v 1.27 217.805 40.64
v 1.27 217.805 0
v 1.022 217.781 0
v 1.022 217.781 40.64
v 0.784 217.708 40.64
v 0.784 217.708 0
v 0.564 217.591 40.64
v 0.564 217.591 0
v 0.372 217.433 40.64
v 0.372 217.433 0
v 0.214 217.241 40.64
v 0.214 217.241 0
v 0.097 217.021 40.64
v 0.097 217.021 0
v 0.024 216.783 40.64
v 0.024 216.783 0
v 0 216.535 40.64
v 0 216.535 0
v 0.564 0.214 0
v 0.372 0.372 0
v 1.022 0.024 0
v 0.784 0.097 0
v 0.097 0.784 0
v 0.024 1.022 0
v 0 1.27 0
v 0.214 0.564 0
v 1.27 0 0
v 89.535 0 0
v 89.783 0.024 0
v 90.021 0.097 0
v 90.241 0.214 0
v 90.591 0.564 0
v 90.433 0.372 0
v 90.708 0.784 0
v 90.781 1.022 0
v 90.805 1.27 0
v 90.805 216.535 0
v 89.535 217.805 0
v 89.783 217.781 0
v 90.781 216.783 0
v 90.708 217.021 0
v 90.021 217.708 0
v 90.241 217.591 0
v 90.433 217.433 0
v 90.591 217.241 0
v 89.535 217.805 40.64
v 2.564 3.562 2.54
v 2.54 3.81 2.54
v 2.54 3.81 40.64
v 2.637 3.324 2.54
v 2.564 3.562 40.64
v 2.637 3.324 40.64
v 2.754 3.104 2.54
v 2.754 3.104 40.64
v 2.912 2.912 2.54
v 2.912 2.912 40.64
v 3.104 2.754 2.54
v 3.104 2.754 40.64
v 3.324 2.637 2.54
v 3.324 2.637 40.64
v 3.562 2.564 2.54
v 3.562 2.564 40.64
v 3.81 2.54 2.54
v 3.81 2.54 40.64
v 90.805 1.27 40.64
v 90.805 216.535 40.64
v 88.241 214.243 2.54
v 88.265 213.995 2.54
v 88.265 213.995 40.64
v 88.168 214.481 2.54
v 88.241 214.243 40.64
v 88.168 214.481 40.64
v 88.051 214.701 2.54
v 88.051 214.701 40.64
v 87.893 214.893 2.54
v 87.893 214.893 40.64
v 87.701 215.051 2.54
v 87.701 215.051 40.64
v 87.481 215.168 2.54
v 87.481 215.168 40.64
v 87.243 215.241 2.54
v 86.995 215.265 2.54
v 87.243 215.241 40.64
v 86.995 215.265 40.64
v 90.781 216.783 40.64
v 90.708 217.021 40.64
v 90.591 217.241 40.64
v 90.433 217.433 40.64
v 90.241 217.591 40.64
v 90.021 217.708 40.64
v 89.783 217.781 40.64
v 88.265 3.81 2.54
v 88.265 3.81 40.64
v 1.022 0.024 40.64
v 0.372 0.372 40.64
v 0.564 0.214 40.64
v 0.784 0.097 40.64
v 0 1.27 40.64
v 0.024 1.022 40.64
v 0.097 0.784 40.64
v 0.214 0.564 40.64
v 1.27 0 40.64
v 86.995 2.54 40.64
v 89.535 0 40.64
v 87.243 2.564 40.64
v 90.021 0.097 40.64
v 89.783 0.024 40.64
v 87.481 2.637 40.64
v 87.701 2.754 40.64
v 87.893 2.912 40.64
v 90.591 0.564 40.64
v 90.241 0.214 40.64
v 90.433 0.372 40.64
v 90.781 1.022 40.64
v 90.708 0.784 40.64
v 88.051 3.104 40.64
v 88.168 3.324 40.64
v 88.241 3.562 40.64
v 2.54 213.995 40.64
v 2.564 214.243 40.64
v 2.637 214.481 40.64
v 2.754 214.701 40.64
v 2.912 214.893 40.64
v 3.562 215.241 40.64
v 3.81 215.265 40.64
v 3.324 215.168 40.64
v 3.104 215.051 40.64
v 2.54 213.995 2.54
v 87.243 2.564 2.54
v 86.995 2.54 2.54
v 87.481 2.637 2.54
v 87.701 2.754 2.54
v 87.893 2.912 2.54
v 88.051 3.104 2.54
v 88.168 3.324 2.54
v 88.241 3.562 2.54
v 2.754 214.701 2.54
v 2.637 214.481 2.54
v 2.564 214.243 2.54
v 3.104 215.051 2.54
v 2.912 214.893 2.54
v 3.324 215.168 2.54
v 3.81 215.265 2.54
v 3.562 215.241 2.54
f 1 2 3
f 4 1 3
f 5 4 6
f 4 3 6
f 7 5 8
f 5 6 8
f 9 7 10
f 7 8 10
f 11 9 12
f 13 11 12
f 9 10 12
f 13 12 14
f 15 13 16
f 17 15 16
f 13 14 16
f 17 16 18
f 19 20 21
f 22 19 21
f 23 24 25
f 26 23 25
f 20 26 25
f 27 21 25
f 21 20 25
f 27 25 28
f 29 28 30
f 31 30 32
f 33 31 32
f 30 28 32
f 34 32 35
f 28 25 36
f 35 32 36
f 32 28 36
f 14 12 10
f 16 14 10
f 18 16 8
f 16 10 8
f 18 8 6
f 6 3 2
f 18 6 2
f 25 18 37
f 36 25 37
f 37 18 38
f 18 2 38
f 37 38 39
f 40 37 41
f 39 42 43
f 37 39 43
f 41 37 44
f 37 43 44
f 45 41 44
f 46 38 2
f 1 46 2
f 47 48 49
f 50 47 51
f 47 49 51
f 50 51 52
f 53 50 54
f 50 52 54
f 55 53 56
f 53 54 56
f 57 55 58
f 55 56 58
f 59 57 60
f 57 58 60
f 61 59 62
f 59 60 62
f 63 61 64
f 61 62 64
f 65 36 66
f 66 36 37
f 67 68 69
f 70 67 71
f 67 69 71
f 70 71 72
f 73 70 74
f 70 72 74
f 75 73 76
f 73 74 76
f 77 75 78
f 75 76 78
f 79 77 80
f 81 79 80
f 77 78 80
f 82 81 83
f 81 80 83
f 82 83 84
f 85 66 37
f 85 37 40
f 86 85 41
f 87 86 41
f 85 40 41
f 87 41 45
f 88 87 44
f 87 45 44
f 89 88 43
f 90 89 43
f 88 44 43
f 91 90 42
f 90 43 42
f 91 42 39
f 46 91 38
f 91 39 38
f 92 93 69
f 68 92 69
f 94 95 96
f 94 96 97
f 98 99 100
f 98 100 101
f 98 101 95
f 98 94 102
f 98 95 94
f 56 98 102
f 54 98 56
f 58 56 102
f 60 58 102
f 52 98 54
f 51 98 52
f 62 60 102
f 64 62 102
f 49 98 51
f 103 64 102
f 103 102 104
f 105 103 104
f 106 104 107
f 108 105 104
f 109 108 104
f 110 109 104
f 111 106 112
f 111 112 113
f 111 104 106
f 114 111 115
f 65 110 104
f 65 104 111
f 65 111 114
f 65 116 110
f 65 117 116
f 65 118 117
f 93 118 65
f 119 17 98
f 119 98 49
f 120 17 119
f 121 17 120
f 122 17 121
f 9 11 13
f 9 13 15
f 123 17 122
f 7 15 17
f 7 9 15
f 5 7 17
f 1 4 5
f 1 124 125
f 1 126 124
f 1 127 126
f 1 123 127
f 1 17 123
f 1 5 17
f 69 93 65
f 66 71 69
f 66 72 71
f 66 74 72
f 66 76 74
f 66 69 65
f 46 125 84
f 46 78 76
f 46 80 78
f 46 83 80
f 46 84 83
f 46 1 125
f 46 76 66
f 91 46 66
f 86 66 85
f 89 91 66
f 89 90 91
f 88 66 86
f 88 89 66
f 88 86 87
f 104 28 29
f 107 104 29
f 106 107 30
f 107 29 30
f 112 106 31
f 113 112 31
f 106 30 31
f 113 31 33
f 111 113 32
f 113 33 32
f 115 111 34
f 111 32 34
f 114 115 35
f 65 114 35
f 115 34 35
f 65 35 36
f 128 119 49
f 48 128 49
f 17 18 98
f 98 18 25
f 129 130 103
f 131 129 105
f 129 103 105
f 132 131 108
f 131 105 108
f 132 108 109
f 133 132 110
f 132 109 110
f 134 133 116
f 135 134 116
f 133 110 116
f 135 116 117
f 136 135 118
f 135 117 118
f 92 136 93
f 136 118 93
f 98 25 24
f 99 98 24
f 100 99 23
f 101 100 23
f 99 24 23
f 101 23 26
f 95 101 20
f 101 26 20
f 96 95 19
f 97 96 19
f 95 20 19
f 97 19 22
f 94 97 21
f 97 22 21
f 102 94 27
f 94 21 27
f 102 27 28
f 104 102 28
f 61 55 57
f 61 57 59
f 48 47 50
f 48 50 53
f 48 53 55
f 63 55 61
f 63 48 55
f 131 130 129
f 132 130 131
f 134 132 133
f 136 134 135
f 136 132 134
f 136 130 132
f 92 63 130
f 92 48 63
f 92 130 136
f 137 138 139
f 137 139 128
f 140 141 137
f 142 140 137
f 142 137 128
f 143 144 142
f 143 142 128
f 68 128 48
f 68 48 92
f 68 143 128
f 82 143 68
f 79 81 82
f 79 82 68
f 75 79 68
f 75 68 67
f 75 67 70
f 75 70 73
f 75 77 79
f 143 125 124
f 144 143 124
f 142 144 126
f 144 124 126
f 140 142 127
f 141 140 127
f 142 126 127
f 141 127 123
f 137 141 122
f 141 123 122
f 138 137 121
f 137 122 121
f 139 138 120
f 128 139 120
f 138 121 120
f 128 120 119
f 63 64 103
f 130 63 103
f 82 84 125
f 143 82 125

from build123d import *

# Parameters (mm, degrees)
F2_DEPTH = 40.64
F4_DEPTH = 38.1


# Not quite as in the source:
# - a variable given as a bare number and used for a length is read in inches; the dataset says mm whatever the document's units were


with BuildPart() as f2:
    # F1 (on Top) → F2 (new body)
    with BuildSketch(Plane.XY):
        with BuildLine():
            ThreePointArc((0, 1.27), (0.3719743879, 0.3719743879), (1.27, 0))
            Line((1.27, 0), (89.535, 0))
            ThreePointArc((89.535, 0), (90.4330256121, 0.3719743879), (90.805, 1.27))
            Line((90.805, 1.27), (90.805, 216.535))
            ThreePointArc((90.805, 216.535), (90.4330256121, 217.4330256121), (89.535, 217.805))
            Line((89.535, 217.805), (1.27, 217.805))
            ThreePointArc((1.27, 217.805), (0.3719743879, 217.4330256121), (0, 216.535))
            Line((0, 216.535), (0, 1.27))
        make_face()
    extrude(amount=F2_DEPTH)

    # F3 (on face) → F4 (cut)
    with BuildSketch(Plane.XY.offset(40.64)):
        with BuildLine():
            Line((2.54, 213.995), (2.54, 3.81))
            ThreePointArc((2.54, 3.81), (2.9119743879, 2.9119743879), (3.81, 2.54))
            Line((3.81, 2.54), (86.995, 2.54))
            ThreePointArc((86.995, 2.54), (87.8930256121, 2.9119743879), (88.265, 3.81))
            Line((88.265, 3.81), (88.265, 213.995))
            ThreePointArc((88.265, 213.995), (87.8930256121, 214.8930256121), (86.995, 215.265))
            Line((86.995, 215.265), (3.81, 215.265))
            ThreePointArc((3.81, 215.265), (2.9119743879, 214.8930256121), (2.54, 213.995))
        make_face()
    extrude(amount=-F4_DEPTH, mode=Mode.SUBTRACT)


solid = f2.part
